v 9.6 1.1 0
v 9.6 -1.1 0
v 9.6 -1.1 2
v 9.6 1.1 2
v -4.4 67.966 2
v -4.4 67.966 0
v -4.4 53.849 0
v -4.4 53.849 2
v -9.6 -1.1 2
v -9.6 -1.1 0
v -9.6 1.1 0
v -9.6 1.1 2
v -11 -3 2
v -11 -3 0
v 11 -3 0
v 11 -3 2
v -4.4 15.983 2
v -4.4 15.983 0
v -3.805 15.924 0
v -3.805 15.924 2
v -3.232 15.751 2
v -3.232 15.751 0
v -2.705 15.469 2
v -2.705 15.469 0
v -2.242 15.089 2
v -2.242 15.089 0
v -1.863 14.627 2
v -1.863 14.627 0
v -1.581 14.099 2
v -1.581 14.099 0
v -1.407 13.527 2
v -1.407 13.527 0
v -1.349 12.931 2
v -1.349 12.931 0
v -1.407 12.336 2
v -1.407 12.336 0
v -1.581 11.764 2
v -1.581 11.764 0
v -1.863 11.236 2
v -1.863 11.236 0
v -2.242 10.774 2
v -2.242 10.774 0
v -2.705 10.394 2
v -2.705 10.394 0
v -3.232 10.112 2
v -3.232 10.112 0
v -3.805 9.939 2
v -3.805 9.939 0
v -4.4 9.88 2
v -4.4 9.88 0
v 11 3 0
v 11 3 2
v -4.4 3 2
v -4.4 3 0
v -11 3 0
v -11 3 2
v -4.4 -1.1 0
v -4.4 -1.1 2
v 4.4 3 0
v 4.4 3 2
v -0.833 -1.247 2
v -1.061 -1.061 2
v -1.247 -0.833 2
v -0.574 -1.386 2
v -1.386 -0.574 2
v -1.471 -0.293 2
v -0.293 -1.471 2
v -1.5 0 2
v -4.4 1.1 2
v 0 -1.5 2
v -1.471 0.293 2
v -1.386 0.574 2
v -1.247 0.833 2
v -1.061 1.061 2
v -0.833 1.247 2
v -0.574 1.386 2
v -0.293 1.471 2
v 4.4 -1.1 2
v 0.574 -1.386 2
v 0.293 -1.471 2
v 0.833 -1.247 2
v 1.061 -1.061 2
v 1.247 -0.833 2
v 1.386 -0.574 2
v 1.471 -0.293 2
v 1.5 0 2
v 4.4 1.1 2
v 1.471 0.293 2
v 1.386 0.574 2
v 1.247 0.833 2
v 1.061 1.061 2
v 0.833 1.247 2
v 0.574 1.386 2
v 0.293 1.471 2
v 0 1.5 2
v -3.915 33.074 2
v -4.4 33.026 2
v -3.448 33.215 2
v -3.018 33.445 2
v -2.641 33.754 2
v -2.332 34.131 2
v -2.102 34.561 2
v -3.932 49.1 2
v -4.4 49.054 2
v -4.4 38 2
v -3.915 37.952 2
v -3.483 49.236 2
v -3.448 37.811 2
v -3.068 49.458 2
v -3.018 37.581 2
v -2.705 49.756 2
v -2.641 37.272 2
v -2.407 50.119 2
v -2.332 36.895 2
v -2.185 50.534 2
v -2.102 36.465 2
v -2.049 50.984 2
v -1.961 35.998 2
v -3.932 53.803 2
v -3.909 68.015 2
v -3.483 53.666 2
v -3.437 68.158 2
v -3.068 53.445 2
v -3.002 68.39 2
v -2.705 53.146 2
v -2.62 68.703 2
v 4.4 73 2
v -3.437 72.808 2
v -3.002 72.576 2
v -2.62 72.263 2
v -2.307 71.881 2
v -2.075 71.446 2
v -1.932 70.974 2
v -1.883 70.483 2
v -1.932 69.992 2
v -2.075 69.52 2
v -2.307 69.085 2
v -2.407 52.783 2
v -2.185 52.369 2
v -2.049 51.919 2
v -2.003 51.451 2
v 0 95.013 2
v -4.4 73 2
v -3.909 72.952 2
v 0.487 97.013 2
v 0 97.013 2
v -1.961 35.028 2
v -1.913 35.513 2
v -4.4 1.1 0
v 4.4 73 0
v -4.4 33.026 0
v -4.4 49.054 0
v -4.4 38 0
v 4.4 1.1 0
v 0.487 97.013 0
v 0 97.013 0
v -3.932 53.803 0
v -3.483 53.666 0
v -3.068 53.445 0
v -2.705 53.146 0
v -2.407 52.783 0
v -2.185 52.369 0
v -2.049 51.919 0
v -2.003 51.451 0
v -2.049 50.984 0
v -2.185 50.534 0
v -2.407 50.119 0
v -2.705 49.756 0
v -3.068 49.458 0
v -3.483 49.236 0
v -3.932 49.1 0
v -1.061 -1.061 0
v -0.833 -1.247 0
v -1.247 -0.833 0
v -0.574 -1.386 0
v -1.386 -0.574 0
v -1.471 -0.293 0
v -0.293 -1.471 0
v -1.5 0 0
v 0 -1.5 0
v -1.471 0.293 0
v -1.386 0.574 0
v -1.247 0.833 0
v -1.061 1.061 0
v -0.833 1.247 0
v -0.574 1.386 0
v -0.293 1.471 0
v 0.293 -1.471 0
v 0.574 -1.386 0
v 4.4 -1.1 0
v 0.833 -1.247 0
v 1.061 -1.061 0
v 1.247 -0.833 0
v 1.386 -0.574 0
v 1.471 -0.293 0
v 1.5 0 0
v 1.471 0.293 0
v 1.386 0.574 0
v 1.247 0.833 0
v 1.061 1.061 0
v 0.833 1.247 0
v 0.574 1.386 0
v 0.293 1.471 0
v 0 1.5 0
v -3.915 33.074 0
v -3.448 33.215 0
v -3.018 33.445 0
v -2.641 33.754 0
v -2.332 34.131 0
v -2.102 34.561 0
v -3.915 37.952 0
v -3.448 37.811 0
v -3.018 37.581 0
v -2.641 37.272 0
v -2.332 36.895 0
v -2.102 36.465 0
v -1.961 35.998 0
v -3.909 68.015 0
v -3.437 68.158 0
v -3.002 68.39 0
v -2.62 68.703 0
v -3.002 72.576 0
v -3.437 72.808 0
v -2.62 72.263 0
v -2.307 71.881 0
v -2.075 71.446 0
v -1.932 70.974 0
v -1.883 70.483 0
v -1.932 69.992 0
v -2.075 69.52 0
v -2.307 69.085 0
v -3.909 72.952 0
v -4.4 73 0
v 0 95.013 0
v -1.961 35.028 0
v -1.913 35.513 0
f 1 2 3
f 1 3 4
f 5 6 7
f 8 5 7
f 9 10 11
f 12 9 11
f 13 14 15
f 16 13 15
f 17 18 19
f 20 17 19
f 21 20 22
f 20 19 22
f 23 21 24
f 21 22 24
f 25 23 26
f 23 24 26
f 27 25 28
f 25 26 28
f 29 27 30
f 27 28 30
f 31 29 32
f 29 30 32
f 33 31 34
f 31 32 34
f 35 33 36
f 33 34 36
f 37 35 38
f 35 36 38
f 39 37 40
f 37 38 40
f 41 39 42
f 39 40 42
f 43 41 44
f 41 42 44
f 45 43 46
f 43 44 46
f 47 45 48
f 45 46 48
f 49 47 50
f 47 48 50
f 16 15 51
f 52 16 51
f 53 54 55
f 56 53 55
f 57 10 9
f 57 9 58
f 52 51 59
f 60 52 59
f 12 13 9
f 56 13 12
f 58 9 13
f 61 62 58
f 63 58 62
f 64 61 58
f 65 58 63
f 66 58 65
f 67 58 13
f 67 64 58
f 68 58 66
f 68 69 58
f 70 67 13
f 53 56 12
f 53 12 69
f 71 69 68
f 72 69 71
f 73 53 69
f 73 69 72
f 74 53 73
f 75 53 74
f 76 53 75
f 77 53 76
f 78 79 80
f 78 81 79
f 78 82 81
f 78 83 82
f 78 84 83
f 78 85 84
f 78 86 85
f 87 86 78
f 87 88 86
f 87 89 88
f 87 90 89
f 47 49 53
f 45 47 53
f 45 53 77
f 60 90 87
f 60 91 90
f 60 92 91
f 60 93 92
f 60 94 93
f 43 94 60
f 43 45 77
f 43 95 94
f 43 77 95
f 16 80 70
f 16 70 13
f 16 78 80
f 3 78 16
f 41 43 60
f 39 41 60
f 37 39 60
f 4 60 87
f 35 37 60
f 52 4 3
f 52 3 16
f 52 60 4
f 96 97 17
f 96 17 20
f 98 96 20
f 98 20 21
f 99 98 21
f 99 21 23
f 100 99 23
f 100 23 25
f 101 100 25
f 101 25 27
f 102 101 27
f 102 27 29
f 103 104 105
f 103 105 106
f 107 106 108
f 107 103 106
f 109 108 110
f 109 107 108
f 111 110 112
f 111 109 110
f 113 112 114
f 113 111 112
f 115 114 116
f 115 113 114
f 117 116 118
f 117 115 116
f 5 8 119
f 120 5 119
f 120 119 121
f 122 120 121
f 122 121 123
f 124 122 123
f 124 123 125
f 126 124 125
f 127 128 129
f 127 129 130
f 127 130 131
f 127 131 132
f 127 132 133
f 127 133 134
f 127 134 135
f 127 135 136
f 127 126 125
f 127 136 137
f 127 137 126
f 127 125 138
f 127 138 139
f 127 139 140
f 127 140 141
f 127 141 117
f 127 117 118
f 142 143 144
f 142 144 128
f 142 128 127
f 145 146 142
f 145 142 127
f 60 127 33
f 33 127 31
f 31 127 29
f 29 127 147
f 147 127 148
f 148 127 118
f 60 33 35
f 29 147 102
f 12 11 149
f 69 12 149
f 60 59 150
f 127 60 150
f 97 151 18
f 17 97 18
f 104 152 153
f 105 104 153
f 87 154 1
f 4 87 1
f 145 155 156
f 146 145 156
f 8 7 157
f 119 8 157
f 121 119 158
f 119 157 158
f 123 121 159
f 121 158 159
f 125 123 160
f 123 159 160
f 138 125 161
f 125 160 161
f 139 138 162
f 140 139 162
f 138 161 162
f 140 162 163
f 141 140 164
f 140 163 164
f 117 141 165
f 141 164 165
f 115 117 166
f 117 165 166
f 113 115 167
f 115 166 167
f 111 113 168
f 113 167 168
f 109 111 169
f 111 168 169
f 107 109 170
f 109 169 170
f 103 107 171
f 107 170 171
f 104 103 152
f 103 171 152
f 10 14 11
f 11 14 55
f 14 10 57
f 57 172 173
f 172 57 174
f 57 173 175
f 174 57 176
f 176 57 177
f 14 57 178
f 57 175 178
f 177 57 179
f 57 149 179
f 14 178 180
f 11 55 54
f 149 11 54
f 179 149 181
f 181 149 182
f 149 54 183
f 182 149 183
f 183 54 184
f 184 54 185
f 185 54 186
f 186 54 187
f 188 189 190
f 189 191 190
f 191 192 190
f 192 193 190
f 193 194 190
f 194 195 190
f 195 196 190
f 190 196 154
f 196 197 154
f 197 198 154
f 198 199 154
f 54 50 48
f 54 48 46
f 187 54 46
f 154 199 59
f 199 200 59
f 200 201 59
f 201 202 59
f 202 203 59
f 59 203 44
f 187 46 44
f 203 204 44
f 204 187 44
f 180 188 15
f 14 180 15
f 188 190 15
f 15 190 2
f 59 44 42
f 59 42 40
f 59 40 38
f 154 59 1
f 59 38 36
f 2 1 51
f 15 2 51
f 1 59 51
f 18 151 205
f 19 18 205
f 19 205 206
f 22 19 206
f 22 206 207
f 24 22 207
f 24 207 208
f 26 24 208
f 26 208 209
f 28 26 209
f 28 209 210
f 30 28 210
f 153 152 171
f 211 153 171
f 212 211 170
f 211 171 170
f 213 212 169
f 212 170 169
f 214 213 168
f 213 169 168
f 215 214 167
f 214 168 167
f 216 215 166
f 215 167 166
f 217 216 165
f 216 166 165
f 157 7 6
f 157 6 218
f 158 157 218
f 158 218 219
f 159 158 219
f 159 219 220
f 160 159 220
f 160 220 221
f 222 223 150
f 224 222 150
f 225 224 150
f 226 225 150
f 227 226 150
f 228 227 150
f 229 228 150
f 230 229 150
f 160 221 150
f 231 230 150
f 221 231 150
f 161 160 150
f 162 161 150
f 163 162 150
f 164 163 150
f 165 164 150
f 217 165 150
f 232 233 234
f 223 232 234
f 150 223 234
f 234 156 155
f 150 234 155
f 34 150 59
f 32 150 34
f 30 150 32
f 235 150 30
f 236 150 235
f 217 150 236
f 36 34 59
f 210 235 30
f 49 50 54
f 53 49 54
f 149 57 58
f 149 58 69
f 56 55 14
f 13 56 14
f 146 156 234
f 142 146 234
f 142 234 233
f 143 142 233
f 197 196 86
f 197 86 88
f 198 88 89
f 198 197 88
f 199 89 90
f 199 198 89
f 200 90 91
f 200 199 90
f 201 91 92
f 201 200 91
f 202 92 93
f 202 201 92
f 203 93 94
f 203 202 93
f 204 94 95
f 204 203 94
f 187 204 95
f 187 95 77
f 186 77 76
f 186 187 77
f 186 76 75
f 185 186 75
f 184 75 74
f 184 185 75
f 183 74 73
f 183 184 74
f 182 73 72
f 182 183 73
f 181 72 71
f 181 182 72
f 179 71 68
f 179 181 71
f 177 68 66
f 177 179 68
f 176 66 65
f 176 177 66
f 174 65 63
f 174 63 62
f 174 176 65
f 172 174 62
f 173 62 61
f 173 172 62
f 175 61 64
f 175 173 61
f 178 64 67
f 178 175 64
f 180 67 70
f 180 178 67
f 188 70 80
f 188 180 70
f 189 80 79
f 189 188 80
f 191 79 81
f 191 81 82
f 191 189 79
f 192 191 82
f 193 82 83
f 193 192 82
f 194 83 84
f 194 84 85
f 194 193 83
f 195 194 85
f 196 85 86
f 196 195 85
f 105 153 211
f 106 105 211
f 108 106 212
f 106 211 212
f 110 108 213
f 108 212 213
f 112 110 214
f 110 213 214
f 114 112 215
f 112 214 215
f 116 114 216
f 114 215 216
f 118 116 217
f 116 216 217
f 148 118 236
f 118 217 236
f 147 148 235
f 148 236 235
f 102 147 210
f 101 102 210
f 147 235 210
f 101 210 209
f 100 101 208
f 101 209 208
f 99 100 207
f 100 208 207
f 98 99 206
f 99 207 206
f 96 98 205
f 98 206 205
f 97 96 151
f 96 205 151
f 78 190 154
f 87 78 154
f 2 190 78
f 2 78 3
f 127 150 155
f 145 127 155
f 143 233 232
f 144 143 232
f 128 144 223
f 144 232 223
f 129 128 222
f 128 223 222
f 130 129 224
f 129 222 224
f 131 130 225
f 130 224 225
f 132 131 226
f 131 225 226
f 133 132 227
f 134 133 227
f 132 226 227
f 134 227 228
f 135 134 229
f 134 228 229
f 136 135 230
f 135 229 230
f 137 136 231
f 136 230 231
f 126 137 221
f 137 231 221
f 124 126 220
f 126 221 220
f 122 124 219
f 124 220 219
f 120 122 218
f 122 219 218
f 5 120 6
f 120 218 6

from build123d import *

# Parameters (mm, degrees)
SKETCH_1_R      = 1.5
SKETCH_1_W      = 5.2
SKETCH_1_H      = 2.2
EXTRUDE_1_DEPTH = 2


with BuildPart() as part:
    # 草图1 → 凸台-拉伸1 (new body)
    with BuildSketch(Plane.XY):
        with BuildLine():
            Line((-11, 0), (-11, -3))
            Line((-11, -3), (11, -3))
            Line((11, -3), (11, 0))
            Line((11, 0), (11, 3))
            Line((11, 3), (4.4, 3))
            Line((4.4, 3), (4.4, 73))
            Line((4.4, 73), (0.486767159, 97.013019707))
            Line((0.486767159, 97.013019707), (0, 97.013019707))
            Line((0, 97.013019707), (0, 95.013019707))
            Line((0, 95.013019707), (-4.4, 73))
            ThreePointArc((-4.4, 73), (-1.88316536, 70.48316536), (-4.4, 67.966330721))
            Line((-4.4, 67.966330721), (-4.4, 53.848593982))
            ThreePointArc((-4.4, 53.848593982), (-2.002653764, 51.451247746), (-4.4, 49.053901511))
            Line((-4.4, 49.053901511), (-4.4, 38))
            ThreePointArc((-4.4, 38), (-1.912982257, 35.512982257), (-4.4, 33.025964514))
            Line((-4.4, 33.025964514), (-4.4, 15.982889536))
            ThreePointArc((-4.4, 15.982889536), (-1.348558079, 12.931447615), (-4.4, 9.880005694))
            Line((-4.4, 9.880005694), (-4.4, 3))
            Line((-4.4, 3), (-11, 3))
            Line((-11, 3), (-11, 0))
        make_face()
        Circle(SKETCH_1_R, mode=Mode.SUBTRACT)
        with Locations((7, 0)):
            Rectangle(SKETCH_1_W, SKETCH_1_H, mode=Mode.SUBTRACT)
        with Locations((-7, 0)):
            Rectangle(SKETCH_1_W, SKETCH_1_H, mode=Mode.SUBTRACT)
    extrude(amount=EXTRUDE_1_DEPTH)


solid = part.part
